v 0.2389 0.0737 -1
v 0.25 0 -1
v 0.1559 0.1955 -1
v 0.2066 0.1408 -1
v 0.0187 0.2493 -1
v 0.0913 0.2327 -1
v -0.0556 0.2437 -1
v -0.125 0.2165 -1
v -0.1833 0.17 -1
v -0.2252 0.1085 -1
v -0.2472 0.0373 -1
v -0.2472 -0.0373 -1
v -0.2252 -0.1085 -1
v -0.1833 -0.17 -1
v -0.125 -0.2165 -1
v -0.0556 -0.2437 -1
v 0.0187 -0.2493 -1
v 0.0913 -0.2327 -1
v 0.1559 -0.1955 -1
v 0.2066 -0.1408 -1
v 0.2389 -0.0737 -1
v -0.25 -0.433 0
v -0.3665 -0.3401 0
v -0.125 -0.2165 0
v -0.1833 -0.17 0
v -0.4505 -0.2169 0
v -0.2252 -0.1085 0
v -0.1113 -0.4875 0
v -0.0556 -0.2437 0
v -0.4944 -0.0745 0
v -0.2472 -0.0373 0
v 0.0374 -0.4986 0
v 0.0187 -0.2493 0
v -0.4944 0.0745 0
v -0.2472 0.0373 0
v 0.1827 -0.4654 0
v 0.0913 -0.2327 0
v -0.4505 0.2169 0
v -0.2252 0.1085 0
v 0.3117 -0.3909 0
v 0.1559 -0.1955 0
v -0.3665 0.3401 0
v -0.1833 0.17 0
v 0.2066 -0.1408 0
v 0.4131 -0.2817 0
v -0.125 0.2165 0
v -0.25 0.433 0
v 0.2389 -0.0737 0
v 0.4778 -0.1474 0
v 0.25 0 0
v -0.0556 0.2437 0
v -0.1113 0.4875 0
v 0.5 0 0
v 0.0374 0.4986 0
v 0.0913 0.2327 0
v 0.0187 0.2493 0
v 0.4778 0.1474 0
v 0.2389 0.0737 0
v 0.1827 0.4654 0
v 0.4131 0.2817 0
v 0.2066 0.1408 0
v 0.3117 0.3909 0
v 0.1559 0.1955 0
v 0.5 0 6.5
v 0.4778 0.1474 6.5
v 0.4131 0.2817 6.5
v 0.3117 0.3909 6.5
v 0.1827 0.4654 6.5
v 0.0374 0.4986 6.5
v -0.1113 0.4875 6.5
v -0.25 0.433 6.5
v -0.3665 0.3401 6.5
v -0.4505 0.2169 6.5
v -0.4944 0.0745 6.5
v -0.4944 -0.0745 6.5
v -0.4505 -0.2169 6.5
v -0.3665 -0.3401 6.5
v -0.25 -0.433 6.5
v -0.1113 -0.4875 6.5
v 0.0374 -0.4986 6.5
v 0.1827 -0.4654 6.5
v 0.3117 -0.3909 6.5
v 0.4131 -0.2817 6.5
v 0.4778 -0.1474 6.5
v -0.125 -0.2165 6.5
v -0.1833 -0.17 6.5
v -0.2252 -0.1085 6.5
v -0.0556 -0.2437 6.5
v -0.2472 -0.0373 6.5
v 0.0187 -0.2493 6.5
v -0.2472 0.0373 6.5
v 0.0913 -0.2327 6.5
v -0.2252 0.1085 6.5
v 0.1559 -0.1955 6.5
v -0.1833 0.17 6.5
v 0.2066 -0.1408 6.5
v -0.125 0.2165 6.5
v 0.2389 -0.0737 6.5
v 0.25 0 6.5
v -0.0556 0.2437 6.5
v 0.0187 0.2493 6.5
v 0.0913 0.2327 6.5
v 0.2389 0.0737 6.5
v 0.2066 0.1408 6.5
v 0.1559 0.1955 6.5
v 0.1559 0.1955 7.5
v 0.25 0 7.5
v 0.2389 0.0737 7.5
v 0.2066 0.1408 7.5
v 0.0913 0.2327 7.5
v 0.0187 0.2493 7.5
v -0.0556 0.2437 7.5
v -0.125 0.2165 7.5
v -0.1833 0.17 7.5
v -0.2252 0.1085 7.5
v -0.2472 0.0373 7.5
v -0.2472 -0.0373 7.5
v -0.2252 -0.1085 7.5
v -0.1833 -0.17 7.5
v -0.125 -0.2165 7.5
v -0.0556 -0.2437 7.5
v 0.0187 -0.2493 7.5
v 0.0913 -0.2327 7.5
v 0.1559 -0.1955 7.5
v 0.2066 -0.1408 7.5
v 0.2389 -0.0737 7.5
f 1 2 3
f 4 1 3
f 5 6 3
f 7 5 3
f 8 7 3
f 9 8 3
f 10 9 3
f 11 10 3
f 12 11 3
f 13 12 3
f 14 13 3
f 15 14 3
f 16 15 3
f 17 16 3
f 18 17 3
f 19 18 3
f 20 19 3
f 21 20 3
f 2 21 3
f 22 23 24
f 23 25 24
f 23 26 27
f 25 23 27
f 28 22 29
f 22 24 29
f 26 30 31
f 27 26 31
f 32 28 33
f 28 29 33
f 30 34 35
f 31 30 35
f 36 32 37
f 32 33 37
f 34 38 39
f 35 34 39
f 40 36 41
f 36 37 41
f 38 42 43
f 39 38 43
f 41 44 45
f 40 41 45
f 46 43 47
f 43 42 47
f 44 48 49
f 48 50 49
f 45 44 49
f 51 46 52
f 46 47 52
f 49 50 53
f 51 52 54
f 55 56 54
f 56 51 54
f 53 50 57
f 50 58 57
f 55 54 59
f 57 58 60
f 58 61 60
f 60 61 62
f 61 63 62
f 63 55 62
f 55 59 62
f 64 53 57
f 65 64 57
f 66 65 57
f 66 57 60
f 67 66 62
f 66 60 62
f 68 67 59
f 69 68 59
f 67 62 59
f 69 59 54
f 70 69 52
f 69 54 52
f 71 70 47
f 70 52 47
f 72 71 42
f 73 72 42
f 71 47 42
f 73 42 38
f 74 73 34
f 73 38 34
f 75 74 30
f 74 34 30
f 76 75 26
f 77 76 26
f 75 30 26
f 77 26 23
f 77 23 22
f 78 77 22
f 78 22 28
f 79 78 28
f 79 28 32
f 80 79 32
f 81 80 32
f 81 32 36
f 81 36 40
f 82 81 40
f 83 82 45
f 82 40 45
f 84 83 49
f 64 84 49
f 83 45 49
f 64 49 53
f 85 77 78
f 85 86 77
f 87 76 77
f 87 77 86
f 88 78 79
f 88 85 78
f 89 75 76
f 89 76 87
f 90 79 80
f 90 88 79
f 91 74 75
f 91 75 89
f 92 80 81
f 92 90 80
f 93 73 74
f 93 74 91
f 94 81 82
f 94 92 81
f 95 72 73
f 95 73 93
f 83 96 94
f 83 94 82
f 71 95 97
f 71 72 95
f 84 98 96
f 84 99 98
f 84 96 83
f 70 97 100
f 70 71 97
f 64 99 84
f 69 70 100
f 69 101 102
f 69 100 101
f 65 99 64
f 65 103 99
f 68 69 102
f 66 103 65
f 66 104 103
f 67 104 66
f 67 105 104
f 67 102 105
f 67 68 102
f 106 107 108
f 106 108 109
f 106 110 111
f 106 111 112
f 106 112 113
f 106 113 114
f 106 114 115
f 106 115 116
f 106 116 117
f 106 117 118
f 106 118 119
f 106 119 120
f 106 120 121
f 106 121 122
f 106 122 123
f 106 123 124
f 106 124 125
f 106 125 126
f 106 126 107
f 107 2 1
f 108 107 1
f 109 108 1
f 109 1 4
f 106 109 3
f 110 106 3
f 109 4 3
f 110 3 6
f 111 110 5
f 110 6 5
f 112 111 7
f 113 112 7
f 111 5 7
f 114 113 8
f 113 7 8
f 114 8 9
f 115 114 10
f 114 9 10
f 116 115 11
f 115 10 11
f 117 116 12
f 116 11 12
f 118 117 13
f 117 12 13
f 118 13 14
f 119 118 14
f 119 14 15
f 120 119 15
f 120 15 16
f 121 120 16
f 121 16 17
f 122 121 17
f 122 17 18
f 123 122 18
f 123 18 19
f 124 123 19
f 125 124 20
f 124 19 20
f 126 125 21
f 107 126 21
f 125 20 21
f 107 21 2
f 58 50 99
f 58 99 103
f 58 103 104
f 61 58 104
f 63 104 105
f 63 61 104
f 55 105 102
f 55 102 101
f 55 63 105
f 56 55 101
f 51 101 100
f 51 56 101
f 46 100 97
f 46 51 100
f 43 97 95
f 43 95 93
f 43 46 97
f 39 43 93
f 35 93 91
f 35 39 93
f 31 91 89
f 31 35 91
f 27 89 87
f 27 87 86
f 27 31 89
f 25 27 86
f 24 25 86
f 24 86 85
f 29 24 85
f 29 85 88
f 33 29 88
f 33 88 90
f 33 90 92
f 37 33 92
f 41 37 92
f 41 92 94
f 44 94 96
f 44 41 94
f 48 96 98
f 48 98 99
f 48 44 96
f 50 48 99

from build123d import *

# Parameters (mm, degrees)
TUBE_R         = 0.5
TUBE_R_2       = 0.25
TUBE_DEPTH     = 6.5
CYLINDER_R     = 0.25
CYLINDER_DEPTH = 8.5


with BuildPart() as tube:
    # Tube → Tube (new body)
    with BuildSketch(Plane.XY):
        Circle(TUBE_R)
        Circle(TUBE_R_2, mode=Mode.SUBTRACT)
    extrude(amount=TUBE_DEPTH)


with BuildPart() as cylinder:
    # Cylinder → Cylinder (new body)
    with BuildSketch(Plane.XY.offset(-1)):
        Circle(CYLINDER_R)
    extrude(amount=CYLINDER_DEPTH)


solid = Compound([tube.part, cylinder.part])
